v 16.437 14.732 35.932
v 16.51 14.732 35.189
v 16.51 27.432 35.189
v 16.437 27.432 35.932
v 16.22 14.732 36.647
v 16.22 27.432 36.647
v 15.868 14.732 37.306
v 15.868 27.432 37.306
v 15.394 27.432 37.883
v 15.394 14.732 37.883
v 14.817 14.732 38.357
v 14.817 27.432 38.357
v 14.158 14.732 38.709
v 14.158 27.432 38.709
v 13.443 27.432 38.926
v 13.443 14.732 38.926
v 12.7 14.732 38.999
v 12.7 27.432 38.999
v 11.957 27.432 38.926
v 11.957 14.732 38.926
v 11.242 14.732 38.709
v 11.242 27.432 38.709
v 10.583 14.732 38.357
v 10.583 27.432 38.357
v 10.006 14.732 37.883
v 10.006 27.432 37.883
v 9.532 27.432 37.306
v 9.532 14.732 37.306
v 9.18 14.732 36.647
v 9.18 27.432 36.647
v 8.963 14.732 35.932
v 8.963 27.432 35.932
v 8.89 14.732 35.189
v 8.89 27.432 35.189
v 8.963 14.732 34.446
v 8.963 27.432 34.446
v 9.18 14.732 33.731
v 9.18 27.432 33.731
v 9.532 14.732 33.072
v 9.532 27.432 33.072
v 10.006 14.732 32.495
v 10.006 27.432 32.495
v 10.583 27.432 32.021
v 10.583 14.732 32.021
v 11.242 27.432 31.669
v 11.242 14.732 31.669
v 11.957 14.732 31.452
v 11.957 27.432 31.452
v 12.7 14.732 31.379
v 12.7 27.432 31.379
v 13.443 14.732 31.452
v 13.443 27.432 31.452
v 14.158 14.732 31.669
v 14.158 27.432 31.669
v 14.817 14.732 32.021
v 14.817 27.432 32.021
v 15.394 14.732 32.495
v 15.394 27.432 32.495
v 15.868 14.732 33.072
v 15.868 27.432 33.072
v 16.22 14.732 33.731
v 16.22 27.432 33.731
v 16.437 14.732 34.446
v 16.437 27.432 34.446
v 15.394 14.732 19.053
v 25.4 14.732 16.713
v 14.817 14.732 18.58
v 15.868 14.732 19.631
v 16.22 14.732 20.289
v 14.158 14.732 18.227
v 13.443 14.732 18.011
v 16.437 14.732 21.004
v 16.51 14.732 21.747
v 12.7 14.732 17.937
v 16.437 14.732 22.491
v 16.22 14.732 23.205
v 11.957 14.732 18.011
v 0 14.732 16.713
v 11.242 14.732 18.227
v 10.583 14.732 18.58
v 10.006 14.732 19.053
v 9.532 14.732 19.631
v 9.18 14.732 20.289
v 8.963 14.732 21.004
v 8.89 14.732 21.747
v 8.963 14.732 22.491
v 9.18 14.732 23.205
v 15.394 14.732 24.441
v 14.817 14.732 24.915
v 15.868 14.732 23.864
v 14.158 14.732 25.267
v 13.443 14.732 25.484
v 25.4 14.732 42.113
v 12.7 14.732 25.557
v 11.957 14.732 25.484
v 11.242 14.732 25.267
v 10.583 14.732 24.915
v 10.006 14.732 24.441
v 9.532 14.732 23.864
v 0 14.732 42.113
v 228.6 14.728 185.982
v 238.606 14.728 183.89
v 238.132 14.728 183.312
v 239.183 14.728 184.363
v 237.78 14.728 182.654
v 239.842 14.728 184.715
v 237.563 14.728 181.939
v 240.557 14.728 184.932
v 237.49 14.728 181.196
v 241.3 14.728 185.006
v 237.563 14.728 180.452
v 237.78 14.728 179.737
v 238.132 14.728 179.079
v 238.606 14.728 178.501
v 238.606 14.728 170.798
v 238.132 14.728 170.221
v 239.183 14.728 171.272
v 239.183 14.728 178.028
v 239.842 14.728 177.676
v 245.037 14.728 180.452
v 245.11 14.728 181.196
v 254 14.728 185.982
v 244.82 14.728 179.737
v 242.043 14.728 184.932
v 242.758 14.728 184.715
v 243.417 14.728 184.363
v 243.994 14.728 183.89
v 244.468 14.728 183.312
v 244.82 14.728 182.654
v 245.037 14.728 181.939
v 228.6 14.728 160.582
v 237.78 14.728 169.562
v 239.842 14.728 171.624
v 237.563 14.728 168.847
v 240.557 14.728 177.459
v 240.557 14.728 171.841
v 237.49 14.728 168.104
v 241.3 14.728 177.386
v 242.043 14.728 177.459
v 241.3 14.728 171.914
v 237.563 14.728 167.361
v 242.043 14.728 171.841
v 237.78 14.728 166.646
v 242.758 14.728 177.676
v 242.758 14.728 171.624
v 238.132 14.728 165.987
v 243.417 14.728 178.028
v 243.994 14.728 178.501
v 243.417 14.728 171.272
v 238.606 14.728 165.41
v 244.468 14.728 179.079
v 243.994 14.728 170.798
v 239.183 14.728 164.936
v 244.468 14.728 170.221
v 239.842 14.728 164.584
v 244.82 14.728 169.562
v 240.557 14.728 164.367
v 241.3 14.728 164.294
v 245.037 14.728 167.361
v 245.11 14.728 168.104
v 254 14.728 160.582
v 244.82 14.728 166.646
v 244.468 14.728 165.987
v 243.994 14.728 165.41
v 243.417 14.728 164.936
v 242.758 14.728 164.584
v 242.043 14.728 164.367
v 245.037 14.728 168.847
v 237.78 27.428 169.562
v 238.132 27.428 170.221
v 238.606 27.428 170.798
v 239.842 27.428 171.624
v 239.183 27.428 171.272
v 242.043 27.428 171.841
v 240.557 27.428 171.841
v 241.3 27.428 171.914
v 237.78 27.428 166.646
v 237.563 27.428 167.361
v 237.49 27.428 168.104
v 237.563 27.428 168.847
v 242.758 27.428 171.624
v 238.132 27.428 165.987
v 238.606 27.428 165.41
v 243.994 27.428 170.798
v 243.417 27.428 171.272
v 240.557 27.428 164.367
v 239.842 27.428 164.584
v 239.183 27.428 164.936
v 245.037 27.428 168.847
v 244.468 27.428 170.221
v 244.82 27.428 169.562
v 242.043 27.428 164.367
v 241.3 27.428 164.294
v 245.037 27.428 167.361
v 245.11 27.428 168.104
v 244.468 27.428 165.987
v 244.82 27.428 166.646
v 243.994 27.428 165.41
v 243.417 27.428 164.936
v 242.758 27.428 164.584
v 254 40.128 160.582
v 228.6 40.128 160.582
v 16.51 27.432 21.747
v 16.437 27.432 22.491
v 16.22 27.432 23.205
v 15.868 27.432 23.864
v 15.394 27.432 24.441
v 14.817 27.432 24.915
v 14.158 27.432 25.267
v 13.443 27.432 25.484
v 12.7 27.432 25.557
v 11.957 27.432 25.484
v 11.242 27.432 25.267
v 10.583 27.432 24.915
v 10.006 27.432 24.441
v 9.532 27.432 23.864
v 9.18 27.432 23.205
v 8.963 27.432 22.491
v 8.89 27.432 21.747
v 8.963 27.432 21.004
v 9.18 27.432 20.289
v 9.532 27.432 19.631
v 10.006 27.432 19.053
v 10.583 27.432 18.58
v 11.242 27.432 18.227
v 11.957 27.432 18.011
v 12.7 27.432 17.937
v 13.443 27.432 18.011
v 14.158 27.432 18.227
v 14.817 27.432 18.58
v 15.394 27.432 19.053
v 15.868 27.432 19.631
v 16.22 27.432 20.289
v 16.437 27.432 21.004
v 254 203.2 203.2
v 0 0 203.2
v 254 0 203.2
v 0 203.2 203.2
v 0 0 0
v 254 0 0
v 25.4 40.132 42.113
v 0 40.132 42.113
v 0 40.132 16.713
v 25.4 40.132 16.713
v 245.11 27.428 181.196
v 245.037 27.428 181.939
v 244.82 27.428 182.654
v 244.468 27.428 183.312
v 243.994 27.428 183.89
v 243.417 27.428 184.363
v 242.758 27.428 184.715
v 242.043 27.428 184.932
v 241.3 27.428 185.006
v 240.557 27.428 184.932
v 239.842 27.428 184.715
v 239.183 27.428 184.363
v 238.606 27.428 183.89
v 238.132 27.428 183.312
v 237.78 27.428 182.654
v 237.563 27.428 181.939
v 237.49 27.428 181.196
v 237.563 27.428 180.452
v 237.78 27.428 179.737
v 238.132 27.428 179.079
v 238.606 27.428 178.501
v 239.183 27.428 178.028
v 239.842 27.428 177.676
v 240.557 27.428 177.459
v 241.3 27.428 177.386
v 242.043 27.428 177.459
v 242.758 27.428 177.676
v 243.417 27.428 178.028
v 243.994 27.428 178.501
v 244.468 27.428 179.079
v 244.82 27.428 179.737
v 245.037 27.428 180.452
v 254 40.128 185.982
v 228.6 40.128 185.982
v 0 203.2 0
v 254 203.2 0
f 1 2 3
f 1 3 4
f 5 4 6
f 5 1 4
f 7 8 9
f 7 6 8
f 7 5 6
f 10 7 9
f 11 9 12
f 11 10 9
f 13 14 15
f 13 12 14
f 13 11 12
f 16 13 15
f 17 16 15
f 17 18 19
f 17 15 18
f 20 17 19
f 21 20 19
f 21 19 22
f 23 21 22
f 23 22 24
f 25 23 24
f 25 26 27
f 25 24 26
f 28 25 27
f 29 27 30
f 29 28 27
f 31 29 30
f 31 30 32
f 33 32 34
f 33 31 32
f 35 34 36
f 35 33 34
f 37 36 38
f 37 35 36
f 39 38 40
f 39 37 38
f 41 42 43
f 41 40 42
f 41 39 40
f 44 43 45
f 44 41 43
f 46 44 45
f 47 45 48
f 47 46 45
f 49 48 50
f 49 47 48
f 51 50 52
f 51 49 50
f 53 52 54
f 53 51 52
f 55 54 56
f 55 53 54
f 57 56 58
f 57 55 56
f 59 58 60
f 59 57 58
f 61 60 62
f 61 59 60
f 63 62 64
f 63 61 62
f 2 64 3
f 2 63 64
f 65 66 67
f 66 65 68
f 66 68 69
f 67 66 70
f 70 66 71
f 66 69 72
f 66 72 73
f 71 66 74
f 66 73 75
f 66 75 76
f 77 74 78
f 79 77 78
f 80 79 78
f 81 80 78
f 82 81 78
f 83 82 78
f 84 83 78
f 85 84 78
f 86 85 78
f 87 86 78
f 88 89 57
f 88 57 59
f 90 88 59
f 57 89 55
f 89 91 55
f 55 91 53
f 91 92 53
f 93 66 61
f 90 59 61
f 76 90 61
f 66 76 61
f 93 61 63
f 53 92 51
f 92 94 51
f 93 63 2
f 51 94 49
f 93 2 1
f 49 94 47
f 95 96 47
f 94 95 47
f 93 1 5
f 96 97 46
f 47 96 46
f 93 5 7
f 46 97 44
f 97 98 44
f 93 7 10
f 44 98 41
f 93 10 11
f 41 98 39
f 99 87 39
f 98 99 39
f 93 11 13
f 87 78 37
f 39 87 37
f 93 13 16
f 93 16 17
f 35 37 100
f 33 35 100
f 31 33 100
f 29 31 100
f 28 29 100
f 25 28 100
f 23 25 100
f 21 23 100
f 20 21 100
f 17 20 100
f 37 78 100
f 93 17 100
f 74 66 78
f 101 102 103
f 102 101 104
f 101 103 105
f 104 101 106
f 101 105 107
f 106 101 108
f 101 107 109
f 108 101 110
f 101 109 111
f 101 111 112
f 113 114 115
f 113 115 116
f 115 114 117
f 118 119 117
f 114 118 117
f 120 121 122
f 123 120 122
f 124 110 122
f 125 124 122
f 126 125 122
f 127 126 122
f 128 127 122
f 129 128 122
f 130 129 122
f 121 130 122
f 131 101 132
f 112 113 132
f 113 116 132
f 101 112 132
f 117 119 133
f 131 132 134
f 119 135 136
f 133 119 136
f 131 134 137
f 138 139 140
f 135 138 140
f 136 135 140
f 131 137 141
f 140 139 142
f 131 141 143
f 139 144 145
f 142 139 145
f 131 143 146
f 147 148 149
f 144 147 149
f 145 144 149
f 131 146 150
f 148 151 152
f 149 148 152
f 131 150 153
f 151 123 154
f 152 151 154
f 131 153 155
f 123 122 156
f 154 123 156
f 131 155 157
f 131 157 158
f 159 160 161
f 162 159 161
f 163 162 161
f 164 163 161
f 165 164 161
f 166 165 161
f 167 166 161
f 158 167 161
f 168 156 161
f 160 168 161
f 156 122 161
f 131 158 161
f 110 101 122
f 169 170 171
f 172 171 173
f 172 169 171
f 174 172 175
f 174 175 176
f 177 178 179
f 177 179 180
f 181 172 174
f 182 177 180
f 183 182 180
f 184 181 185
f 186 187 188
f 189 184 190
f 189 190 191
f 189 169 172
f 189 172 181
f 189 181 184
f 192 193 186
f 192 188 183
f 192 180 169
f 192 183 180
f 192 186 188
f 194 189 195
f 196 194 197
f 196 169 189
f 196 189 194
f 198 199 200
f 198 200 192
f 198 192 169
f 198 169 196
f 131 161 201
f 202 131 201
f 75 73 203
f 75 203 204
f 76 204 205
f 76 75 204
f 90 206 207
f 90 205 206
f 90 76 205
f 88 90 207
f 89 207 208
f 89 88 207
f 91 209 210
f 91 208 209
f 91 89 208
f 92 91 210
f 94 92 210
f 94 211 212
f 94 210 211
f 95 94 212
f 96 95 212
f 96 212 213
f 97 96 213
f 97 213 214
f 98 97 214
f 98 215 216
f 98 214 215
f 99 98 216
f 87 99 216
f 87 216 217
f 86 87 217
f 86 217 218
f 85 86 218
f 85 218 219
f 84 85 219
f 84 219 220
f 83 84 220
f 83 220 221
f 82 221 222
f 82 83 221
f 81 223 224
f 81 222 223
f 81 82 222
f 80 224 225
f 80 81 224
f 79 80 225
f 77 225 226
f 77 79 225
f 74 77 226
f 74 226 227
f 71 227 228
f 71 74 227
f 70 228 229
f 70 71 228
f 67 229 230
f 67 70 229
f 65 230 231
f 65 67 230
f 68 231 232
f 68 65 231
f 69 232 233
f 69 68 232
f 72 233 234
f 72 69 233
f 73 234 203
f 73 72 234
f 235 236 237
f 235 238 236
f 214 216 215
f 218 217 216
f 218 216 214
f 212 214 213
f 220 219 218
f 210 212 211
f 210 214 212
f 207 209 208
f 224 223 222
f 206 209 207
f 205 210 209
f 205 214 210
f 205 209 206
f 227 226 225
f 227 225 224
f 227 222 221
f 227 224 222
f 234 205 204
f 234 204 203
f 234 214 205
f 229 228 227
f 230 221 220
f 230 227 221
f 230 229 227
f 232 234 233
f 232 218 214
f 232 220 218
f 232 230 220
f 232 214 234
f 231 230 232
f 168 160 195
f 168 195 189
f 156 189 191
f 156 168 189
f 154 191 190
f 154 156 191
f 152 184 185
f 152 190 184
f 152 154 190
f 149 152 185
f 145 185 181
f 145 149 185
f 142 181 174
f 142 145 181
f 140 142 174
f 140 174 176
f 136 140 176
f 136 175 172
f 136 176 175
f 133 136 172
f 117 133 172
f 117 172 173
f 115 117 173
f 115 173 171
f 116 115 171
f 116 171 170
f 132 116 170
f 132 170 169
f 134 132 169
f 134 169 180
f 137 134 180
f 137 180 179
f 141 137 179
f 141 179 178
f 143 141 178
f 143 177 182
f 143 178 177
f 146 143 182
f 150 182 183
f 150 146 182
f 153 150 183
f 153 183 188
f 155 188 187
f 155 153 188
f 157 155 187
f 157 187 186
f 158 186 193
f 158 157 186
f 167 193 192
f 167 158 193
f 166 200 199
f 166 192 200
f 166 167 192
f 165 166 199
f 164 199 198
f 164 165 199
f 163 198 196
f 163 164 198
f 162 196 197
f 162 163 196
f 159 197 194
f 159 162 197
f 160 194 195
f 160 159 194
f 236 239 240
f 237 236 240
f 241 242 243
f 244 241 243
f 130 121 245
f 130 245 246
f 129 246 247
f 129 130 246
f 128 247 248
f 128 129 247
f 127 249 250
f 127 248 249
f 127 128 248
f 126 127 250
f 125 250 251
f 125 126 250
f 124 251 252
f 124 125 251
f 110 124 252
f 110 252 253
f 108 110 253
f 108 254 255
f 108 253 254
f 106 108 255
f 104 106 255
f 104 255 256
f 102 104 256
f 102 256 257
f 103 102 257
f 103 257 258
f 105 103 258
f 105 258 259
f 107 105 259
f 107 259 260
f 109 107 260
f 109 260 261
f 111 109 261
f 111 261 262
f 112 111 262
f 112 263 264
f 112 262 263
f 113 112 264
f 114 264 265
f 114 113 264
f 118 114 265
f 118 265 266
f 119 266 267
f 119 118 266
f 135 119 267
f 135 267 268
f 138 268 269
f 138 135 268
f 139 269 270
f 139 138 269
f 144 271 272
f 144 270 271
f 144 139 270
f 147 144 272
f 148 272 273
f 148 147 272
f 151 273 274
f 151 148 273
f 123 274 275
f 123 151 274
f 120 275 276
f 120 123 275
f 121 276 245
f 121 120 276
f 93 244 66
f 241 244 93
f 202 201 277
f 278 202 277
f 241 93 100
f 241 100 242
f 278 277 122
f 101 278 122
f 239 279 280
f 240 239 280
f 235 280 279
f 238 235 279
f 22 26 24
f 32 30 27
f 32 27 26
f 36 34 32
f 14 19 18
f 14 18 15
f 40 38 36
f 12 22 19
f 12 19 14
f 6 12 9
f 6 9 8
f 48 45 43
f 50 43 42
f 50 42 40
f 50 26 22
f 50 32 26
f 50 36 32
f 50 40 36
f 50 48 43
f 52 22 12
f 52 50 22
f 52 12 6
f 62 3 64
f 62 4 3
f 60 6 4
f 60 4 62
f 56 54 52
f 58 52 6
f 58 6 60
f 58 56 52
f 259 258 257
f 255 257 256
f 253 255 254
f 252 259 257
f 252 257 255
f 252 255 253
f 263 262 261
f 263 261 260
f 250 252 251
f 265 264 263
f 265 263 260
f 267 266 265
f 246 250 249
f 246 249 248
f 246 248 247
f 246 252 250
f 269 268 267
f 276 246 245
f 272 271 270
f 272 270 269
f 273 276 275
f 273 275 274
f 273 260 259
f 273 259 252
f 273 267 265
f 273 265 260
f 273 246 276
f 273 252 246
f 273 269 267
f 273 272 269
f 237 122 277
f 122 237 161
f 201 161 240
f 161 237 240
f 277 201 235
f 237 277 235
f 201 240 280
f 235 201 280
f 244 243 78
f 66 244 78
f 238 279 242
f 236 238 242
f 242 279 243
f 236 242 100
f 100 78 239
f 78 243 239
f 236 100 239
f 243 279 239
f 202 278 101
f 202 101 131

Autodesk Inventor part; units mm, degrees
ref_plane "YZ Plane" through (0, 0, 0) normal (1, 0, 0) x (0, 1, 0)
ref_plane "XZ Plane" through (0, 0, 0) normal (0, 1, 0) x (-1, 0, 0)
ref_plane "XY Plane" through (0, 0, 0) normal (0, 0, 1) x (1, 0, 0)
sketch "Sketch1" plane through (0, 0, 0) normal (0, 0, 1) x (1, 0, 0)
  line L0 (0, 0) -> (254, 0)
  line L1 (254, 0) -> (254, 203.2)
  line L2 (254, 203.2) -> (0, 203.2)
  line L3 (0, 203.2) -> (0, 0)
  dimension "d0" = 254
  dimension "d1" = 203.2
extrude "Extrusion1" add sketch "Sketch1" along normal blind 203.2
sketch "Sketch3" plane through (254, 0, 0) normal (1, 0, 0) x (0, 0, -1)
  line L0 (-203.2, 203.2) -> (-203.2, 0) projected
  line L1 (0, 0) -> (-203.2, 0) projected
  line L2 (-185.9823, 14.7282) -> (-160.5823, 14.7282)
  line L3 (-160.5823, 14.7282) -> (-160.5823, 40.1282)
  line L4 (-160.5823, 40.1282) -> (-185.9823, 40.1282)
  line L5 (-185.9823, 40.1282) -> (-185.9823, 14.7282)
  dimension "d10" = 25.4
  dimension "d11" = 25.4
  dimension "d12" = 17.2177
  dimension "d13" = 14.7282
extrude "Extrusion3" cut sketch "Sketch3" against normal blind 25.4
sketch "Sketch4" plane through (254, 14.7282, 185.9823) normal (0, 1, 0) x (1, 0, 0)
  circle A0 centre (-12.7, 4.7868) radius 3.81
  circle A1 centre (-12.7, 17.8785) radius 3.81
  point P0 (-254, 185.9823)
  dimension "d16" = 7.62
  dimension "d17" = 7.62
extrude "Extrusion4" add sketch "Sketch4" along normal blind 12.7
sketch "Sketch5" plane through (0, 0, 0) normal (-1, 0, 0) x (0, 0, 1)
  line L0 (0, 203.2) -> (0, 0) projected
  line L1 (0, 0) -> (203.2, 0) projected
  line L2 (16.7132, 14.732) -> (42.1132, 14.732)
  line L3 (42.1132, 14.732) -> (42.1132, 40.132)
  line L4 (42.1132, 40.132) -> (16.7132, 40.132)
  line L5 (16.7132, 40.132) -> (16.7132, 14.732)
  dimension "d20" = 25.4
  dimension "d21" = 25.4
  dimension "d22" = 16.7132
  dimension "d23" = 14.732
extrude "Extrusion5" cut sketch "Sketch5" against normal blind 25.4
sketch "Sketch6" plane through (0, 14.732, 42.1132) normal (0, 1, 0) x (1, 0, 0)
  circle A0 centre (12.7, 20.3658) radius 3.81
  circle A1 centre (12.7, 6.9242) radius 3.81
  point P0 (0, 42.1132)
  dimension "d26" = 7.62
  dimension "d27" = 7.62
extrude "Extrusion6" add sketch "Sketch6" along normal blind 12.7
properties part number "AC-DC converter"
